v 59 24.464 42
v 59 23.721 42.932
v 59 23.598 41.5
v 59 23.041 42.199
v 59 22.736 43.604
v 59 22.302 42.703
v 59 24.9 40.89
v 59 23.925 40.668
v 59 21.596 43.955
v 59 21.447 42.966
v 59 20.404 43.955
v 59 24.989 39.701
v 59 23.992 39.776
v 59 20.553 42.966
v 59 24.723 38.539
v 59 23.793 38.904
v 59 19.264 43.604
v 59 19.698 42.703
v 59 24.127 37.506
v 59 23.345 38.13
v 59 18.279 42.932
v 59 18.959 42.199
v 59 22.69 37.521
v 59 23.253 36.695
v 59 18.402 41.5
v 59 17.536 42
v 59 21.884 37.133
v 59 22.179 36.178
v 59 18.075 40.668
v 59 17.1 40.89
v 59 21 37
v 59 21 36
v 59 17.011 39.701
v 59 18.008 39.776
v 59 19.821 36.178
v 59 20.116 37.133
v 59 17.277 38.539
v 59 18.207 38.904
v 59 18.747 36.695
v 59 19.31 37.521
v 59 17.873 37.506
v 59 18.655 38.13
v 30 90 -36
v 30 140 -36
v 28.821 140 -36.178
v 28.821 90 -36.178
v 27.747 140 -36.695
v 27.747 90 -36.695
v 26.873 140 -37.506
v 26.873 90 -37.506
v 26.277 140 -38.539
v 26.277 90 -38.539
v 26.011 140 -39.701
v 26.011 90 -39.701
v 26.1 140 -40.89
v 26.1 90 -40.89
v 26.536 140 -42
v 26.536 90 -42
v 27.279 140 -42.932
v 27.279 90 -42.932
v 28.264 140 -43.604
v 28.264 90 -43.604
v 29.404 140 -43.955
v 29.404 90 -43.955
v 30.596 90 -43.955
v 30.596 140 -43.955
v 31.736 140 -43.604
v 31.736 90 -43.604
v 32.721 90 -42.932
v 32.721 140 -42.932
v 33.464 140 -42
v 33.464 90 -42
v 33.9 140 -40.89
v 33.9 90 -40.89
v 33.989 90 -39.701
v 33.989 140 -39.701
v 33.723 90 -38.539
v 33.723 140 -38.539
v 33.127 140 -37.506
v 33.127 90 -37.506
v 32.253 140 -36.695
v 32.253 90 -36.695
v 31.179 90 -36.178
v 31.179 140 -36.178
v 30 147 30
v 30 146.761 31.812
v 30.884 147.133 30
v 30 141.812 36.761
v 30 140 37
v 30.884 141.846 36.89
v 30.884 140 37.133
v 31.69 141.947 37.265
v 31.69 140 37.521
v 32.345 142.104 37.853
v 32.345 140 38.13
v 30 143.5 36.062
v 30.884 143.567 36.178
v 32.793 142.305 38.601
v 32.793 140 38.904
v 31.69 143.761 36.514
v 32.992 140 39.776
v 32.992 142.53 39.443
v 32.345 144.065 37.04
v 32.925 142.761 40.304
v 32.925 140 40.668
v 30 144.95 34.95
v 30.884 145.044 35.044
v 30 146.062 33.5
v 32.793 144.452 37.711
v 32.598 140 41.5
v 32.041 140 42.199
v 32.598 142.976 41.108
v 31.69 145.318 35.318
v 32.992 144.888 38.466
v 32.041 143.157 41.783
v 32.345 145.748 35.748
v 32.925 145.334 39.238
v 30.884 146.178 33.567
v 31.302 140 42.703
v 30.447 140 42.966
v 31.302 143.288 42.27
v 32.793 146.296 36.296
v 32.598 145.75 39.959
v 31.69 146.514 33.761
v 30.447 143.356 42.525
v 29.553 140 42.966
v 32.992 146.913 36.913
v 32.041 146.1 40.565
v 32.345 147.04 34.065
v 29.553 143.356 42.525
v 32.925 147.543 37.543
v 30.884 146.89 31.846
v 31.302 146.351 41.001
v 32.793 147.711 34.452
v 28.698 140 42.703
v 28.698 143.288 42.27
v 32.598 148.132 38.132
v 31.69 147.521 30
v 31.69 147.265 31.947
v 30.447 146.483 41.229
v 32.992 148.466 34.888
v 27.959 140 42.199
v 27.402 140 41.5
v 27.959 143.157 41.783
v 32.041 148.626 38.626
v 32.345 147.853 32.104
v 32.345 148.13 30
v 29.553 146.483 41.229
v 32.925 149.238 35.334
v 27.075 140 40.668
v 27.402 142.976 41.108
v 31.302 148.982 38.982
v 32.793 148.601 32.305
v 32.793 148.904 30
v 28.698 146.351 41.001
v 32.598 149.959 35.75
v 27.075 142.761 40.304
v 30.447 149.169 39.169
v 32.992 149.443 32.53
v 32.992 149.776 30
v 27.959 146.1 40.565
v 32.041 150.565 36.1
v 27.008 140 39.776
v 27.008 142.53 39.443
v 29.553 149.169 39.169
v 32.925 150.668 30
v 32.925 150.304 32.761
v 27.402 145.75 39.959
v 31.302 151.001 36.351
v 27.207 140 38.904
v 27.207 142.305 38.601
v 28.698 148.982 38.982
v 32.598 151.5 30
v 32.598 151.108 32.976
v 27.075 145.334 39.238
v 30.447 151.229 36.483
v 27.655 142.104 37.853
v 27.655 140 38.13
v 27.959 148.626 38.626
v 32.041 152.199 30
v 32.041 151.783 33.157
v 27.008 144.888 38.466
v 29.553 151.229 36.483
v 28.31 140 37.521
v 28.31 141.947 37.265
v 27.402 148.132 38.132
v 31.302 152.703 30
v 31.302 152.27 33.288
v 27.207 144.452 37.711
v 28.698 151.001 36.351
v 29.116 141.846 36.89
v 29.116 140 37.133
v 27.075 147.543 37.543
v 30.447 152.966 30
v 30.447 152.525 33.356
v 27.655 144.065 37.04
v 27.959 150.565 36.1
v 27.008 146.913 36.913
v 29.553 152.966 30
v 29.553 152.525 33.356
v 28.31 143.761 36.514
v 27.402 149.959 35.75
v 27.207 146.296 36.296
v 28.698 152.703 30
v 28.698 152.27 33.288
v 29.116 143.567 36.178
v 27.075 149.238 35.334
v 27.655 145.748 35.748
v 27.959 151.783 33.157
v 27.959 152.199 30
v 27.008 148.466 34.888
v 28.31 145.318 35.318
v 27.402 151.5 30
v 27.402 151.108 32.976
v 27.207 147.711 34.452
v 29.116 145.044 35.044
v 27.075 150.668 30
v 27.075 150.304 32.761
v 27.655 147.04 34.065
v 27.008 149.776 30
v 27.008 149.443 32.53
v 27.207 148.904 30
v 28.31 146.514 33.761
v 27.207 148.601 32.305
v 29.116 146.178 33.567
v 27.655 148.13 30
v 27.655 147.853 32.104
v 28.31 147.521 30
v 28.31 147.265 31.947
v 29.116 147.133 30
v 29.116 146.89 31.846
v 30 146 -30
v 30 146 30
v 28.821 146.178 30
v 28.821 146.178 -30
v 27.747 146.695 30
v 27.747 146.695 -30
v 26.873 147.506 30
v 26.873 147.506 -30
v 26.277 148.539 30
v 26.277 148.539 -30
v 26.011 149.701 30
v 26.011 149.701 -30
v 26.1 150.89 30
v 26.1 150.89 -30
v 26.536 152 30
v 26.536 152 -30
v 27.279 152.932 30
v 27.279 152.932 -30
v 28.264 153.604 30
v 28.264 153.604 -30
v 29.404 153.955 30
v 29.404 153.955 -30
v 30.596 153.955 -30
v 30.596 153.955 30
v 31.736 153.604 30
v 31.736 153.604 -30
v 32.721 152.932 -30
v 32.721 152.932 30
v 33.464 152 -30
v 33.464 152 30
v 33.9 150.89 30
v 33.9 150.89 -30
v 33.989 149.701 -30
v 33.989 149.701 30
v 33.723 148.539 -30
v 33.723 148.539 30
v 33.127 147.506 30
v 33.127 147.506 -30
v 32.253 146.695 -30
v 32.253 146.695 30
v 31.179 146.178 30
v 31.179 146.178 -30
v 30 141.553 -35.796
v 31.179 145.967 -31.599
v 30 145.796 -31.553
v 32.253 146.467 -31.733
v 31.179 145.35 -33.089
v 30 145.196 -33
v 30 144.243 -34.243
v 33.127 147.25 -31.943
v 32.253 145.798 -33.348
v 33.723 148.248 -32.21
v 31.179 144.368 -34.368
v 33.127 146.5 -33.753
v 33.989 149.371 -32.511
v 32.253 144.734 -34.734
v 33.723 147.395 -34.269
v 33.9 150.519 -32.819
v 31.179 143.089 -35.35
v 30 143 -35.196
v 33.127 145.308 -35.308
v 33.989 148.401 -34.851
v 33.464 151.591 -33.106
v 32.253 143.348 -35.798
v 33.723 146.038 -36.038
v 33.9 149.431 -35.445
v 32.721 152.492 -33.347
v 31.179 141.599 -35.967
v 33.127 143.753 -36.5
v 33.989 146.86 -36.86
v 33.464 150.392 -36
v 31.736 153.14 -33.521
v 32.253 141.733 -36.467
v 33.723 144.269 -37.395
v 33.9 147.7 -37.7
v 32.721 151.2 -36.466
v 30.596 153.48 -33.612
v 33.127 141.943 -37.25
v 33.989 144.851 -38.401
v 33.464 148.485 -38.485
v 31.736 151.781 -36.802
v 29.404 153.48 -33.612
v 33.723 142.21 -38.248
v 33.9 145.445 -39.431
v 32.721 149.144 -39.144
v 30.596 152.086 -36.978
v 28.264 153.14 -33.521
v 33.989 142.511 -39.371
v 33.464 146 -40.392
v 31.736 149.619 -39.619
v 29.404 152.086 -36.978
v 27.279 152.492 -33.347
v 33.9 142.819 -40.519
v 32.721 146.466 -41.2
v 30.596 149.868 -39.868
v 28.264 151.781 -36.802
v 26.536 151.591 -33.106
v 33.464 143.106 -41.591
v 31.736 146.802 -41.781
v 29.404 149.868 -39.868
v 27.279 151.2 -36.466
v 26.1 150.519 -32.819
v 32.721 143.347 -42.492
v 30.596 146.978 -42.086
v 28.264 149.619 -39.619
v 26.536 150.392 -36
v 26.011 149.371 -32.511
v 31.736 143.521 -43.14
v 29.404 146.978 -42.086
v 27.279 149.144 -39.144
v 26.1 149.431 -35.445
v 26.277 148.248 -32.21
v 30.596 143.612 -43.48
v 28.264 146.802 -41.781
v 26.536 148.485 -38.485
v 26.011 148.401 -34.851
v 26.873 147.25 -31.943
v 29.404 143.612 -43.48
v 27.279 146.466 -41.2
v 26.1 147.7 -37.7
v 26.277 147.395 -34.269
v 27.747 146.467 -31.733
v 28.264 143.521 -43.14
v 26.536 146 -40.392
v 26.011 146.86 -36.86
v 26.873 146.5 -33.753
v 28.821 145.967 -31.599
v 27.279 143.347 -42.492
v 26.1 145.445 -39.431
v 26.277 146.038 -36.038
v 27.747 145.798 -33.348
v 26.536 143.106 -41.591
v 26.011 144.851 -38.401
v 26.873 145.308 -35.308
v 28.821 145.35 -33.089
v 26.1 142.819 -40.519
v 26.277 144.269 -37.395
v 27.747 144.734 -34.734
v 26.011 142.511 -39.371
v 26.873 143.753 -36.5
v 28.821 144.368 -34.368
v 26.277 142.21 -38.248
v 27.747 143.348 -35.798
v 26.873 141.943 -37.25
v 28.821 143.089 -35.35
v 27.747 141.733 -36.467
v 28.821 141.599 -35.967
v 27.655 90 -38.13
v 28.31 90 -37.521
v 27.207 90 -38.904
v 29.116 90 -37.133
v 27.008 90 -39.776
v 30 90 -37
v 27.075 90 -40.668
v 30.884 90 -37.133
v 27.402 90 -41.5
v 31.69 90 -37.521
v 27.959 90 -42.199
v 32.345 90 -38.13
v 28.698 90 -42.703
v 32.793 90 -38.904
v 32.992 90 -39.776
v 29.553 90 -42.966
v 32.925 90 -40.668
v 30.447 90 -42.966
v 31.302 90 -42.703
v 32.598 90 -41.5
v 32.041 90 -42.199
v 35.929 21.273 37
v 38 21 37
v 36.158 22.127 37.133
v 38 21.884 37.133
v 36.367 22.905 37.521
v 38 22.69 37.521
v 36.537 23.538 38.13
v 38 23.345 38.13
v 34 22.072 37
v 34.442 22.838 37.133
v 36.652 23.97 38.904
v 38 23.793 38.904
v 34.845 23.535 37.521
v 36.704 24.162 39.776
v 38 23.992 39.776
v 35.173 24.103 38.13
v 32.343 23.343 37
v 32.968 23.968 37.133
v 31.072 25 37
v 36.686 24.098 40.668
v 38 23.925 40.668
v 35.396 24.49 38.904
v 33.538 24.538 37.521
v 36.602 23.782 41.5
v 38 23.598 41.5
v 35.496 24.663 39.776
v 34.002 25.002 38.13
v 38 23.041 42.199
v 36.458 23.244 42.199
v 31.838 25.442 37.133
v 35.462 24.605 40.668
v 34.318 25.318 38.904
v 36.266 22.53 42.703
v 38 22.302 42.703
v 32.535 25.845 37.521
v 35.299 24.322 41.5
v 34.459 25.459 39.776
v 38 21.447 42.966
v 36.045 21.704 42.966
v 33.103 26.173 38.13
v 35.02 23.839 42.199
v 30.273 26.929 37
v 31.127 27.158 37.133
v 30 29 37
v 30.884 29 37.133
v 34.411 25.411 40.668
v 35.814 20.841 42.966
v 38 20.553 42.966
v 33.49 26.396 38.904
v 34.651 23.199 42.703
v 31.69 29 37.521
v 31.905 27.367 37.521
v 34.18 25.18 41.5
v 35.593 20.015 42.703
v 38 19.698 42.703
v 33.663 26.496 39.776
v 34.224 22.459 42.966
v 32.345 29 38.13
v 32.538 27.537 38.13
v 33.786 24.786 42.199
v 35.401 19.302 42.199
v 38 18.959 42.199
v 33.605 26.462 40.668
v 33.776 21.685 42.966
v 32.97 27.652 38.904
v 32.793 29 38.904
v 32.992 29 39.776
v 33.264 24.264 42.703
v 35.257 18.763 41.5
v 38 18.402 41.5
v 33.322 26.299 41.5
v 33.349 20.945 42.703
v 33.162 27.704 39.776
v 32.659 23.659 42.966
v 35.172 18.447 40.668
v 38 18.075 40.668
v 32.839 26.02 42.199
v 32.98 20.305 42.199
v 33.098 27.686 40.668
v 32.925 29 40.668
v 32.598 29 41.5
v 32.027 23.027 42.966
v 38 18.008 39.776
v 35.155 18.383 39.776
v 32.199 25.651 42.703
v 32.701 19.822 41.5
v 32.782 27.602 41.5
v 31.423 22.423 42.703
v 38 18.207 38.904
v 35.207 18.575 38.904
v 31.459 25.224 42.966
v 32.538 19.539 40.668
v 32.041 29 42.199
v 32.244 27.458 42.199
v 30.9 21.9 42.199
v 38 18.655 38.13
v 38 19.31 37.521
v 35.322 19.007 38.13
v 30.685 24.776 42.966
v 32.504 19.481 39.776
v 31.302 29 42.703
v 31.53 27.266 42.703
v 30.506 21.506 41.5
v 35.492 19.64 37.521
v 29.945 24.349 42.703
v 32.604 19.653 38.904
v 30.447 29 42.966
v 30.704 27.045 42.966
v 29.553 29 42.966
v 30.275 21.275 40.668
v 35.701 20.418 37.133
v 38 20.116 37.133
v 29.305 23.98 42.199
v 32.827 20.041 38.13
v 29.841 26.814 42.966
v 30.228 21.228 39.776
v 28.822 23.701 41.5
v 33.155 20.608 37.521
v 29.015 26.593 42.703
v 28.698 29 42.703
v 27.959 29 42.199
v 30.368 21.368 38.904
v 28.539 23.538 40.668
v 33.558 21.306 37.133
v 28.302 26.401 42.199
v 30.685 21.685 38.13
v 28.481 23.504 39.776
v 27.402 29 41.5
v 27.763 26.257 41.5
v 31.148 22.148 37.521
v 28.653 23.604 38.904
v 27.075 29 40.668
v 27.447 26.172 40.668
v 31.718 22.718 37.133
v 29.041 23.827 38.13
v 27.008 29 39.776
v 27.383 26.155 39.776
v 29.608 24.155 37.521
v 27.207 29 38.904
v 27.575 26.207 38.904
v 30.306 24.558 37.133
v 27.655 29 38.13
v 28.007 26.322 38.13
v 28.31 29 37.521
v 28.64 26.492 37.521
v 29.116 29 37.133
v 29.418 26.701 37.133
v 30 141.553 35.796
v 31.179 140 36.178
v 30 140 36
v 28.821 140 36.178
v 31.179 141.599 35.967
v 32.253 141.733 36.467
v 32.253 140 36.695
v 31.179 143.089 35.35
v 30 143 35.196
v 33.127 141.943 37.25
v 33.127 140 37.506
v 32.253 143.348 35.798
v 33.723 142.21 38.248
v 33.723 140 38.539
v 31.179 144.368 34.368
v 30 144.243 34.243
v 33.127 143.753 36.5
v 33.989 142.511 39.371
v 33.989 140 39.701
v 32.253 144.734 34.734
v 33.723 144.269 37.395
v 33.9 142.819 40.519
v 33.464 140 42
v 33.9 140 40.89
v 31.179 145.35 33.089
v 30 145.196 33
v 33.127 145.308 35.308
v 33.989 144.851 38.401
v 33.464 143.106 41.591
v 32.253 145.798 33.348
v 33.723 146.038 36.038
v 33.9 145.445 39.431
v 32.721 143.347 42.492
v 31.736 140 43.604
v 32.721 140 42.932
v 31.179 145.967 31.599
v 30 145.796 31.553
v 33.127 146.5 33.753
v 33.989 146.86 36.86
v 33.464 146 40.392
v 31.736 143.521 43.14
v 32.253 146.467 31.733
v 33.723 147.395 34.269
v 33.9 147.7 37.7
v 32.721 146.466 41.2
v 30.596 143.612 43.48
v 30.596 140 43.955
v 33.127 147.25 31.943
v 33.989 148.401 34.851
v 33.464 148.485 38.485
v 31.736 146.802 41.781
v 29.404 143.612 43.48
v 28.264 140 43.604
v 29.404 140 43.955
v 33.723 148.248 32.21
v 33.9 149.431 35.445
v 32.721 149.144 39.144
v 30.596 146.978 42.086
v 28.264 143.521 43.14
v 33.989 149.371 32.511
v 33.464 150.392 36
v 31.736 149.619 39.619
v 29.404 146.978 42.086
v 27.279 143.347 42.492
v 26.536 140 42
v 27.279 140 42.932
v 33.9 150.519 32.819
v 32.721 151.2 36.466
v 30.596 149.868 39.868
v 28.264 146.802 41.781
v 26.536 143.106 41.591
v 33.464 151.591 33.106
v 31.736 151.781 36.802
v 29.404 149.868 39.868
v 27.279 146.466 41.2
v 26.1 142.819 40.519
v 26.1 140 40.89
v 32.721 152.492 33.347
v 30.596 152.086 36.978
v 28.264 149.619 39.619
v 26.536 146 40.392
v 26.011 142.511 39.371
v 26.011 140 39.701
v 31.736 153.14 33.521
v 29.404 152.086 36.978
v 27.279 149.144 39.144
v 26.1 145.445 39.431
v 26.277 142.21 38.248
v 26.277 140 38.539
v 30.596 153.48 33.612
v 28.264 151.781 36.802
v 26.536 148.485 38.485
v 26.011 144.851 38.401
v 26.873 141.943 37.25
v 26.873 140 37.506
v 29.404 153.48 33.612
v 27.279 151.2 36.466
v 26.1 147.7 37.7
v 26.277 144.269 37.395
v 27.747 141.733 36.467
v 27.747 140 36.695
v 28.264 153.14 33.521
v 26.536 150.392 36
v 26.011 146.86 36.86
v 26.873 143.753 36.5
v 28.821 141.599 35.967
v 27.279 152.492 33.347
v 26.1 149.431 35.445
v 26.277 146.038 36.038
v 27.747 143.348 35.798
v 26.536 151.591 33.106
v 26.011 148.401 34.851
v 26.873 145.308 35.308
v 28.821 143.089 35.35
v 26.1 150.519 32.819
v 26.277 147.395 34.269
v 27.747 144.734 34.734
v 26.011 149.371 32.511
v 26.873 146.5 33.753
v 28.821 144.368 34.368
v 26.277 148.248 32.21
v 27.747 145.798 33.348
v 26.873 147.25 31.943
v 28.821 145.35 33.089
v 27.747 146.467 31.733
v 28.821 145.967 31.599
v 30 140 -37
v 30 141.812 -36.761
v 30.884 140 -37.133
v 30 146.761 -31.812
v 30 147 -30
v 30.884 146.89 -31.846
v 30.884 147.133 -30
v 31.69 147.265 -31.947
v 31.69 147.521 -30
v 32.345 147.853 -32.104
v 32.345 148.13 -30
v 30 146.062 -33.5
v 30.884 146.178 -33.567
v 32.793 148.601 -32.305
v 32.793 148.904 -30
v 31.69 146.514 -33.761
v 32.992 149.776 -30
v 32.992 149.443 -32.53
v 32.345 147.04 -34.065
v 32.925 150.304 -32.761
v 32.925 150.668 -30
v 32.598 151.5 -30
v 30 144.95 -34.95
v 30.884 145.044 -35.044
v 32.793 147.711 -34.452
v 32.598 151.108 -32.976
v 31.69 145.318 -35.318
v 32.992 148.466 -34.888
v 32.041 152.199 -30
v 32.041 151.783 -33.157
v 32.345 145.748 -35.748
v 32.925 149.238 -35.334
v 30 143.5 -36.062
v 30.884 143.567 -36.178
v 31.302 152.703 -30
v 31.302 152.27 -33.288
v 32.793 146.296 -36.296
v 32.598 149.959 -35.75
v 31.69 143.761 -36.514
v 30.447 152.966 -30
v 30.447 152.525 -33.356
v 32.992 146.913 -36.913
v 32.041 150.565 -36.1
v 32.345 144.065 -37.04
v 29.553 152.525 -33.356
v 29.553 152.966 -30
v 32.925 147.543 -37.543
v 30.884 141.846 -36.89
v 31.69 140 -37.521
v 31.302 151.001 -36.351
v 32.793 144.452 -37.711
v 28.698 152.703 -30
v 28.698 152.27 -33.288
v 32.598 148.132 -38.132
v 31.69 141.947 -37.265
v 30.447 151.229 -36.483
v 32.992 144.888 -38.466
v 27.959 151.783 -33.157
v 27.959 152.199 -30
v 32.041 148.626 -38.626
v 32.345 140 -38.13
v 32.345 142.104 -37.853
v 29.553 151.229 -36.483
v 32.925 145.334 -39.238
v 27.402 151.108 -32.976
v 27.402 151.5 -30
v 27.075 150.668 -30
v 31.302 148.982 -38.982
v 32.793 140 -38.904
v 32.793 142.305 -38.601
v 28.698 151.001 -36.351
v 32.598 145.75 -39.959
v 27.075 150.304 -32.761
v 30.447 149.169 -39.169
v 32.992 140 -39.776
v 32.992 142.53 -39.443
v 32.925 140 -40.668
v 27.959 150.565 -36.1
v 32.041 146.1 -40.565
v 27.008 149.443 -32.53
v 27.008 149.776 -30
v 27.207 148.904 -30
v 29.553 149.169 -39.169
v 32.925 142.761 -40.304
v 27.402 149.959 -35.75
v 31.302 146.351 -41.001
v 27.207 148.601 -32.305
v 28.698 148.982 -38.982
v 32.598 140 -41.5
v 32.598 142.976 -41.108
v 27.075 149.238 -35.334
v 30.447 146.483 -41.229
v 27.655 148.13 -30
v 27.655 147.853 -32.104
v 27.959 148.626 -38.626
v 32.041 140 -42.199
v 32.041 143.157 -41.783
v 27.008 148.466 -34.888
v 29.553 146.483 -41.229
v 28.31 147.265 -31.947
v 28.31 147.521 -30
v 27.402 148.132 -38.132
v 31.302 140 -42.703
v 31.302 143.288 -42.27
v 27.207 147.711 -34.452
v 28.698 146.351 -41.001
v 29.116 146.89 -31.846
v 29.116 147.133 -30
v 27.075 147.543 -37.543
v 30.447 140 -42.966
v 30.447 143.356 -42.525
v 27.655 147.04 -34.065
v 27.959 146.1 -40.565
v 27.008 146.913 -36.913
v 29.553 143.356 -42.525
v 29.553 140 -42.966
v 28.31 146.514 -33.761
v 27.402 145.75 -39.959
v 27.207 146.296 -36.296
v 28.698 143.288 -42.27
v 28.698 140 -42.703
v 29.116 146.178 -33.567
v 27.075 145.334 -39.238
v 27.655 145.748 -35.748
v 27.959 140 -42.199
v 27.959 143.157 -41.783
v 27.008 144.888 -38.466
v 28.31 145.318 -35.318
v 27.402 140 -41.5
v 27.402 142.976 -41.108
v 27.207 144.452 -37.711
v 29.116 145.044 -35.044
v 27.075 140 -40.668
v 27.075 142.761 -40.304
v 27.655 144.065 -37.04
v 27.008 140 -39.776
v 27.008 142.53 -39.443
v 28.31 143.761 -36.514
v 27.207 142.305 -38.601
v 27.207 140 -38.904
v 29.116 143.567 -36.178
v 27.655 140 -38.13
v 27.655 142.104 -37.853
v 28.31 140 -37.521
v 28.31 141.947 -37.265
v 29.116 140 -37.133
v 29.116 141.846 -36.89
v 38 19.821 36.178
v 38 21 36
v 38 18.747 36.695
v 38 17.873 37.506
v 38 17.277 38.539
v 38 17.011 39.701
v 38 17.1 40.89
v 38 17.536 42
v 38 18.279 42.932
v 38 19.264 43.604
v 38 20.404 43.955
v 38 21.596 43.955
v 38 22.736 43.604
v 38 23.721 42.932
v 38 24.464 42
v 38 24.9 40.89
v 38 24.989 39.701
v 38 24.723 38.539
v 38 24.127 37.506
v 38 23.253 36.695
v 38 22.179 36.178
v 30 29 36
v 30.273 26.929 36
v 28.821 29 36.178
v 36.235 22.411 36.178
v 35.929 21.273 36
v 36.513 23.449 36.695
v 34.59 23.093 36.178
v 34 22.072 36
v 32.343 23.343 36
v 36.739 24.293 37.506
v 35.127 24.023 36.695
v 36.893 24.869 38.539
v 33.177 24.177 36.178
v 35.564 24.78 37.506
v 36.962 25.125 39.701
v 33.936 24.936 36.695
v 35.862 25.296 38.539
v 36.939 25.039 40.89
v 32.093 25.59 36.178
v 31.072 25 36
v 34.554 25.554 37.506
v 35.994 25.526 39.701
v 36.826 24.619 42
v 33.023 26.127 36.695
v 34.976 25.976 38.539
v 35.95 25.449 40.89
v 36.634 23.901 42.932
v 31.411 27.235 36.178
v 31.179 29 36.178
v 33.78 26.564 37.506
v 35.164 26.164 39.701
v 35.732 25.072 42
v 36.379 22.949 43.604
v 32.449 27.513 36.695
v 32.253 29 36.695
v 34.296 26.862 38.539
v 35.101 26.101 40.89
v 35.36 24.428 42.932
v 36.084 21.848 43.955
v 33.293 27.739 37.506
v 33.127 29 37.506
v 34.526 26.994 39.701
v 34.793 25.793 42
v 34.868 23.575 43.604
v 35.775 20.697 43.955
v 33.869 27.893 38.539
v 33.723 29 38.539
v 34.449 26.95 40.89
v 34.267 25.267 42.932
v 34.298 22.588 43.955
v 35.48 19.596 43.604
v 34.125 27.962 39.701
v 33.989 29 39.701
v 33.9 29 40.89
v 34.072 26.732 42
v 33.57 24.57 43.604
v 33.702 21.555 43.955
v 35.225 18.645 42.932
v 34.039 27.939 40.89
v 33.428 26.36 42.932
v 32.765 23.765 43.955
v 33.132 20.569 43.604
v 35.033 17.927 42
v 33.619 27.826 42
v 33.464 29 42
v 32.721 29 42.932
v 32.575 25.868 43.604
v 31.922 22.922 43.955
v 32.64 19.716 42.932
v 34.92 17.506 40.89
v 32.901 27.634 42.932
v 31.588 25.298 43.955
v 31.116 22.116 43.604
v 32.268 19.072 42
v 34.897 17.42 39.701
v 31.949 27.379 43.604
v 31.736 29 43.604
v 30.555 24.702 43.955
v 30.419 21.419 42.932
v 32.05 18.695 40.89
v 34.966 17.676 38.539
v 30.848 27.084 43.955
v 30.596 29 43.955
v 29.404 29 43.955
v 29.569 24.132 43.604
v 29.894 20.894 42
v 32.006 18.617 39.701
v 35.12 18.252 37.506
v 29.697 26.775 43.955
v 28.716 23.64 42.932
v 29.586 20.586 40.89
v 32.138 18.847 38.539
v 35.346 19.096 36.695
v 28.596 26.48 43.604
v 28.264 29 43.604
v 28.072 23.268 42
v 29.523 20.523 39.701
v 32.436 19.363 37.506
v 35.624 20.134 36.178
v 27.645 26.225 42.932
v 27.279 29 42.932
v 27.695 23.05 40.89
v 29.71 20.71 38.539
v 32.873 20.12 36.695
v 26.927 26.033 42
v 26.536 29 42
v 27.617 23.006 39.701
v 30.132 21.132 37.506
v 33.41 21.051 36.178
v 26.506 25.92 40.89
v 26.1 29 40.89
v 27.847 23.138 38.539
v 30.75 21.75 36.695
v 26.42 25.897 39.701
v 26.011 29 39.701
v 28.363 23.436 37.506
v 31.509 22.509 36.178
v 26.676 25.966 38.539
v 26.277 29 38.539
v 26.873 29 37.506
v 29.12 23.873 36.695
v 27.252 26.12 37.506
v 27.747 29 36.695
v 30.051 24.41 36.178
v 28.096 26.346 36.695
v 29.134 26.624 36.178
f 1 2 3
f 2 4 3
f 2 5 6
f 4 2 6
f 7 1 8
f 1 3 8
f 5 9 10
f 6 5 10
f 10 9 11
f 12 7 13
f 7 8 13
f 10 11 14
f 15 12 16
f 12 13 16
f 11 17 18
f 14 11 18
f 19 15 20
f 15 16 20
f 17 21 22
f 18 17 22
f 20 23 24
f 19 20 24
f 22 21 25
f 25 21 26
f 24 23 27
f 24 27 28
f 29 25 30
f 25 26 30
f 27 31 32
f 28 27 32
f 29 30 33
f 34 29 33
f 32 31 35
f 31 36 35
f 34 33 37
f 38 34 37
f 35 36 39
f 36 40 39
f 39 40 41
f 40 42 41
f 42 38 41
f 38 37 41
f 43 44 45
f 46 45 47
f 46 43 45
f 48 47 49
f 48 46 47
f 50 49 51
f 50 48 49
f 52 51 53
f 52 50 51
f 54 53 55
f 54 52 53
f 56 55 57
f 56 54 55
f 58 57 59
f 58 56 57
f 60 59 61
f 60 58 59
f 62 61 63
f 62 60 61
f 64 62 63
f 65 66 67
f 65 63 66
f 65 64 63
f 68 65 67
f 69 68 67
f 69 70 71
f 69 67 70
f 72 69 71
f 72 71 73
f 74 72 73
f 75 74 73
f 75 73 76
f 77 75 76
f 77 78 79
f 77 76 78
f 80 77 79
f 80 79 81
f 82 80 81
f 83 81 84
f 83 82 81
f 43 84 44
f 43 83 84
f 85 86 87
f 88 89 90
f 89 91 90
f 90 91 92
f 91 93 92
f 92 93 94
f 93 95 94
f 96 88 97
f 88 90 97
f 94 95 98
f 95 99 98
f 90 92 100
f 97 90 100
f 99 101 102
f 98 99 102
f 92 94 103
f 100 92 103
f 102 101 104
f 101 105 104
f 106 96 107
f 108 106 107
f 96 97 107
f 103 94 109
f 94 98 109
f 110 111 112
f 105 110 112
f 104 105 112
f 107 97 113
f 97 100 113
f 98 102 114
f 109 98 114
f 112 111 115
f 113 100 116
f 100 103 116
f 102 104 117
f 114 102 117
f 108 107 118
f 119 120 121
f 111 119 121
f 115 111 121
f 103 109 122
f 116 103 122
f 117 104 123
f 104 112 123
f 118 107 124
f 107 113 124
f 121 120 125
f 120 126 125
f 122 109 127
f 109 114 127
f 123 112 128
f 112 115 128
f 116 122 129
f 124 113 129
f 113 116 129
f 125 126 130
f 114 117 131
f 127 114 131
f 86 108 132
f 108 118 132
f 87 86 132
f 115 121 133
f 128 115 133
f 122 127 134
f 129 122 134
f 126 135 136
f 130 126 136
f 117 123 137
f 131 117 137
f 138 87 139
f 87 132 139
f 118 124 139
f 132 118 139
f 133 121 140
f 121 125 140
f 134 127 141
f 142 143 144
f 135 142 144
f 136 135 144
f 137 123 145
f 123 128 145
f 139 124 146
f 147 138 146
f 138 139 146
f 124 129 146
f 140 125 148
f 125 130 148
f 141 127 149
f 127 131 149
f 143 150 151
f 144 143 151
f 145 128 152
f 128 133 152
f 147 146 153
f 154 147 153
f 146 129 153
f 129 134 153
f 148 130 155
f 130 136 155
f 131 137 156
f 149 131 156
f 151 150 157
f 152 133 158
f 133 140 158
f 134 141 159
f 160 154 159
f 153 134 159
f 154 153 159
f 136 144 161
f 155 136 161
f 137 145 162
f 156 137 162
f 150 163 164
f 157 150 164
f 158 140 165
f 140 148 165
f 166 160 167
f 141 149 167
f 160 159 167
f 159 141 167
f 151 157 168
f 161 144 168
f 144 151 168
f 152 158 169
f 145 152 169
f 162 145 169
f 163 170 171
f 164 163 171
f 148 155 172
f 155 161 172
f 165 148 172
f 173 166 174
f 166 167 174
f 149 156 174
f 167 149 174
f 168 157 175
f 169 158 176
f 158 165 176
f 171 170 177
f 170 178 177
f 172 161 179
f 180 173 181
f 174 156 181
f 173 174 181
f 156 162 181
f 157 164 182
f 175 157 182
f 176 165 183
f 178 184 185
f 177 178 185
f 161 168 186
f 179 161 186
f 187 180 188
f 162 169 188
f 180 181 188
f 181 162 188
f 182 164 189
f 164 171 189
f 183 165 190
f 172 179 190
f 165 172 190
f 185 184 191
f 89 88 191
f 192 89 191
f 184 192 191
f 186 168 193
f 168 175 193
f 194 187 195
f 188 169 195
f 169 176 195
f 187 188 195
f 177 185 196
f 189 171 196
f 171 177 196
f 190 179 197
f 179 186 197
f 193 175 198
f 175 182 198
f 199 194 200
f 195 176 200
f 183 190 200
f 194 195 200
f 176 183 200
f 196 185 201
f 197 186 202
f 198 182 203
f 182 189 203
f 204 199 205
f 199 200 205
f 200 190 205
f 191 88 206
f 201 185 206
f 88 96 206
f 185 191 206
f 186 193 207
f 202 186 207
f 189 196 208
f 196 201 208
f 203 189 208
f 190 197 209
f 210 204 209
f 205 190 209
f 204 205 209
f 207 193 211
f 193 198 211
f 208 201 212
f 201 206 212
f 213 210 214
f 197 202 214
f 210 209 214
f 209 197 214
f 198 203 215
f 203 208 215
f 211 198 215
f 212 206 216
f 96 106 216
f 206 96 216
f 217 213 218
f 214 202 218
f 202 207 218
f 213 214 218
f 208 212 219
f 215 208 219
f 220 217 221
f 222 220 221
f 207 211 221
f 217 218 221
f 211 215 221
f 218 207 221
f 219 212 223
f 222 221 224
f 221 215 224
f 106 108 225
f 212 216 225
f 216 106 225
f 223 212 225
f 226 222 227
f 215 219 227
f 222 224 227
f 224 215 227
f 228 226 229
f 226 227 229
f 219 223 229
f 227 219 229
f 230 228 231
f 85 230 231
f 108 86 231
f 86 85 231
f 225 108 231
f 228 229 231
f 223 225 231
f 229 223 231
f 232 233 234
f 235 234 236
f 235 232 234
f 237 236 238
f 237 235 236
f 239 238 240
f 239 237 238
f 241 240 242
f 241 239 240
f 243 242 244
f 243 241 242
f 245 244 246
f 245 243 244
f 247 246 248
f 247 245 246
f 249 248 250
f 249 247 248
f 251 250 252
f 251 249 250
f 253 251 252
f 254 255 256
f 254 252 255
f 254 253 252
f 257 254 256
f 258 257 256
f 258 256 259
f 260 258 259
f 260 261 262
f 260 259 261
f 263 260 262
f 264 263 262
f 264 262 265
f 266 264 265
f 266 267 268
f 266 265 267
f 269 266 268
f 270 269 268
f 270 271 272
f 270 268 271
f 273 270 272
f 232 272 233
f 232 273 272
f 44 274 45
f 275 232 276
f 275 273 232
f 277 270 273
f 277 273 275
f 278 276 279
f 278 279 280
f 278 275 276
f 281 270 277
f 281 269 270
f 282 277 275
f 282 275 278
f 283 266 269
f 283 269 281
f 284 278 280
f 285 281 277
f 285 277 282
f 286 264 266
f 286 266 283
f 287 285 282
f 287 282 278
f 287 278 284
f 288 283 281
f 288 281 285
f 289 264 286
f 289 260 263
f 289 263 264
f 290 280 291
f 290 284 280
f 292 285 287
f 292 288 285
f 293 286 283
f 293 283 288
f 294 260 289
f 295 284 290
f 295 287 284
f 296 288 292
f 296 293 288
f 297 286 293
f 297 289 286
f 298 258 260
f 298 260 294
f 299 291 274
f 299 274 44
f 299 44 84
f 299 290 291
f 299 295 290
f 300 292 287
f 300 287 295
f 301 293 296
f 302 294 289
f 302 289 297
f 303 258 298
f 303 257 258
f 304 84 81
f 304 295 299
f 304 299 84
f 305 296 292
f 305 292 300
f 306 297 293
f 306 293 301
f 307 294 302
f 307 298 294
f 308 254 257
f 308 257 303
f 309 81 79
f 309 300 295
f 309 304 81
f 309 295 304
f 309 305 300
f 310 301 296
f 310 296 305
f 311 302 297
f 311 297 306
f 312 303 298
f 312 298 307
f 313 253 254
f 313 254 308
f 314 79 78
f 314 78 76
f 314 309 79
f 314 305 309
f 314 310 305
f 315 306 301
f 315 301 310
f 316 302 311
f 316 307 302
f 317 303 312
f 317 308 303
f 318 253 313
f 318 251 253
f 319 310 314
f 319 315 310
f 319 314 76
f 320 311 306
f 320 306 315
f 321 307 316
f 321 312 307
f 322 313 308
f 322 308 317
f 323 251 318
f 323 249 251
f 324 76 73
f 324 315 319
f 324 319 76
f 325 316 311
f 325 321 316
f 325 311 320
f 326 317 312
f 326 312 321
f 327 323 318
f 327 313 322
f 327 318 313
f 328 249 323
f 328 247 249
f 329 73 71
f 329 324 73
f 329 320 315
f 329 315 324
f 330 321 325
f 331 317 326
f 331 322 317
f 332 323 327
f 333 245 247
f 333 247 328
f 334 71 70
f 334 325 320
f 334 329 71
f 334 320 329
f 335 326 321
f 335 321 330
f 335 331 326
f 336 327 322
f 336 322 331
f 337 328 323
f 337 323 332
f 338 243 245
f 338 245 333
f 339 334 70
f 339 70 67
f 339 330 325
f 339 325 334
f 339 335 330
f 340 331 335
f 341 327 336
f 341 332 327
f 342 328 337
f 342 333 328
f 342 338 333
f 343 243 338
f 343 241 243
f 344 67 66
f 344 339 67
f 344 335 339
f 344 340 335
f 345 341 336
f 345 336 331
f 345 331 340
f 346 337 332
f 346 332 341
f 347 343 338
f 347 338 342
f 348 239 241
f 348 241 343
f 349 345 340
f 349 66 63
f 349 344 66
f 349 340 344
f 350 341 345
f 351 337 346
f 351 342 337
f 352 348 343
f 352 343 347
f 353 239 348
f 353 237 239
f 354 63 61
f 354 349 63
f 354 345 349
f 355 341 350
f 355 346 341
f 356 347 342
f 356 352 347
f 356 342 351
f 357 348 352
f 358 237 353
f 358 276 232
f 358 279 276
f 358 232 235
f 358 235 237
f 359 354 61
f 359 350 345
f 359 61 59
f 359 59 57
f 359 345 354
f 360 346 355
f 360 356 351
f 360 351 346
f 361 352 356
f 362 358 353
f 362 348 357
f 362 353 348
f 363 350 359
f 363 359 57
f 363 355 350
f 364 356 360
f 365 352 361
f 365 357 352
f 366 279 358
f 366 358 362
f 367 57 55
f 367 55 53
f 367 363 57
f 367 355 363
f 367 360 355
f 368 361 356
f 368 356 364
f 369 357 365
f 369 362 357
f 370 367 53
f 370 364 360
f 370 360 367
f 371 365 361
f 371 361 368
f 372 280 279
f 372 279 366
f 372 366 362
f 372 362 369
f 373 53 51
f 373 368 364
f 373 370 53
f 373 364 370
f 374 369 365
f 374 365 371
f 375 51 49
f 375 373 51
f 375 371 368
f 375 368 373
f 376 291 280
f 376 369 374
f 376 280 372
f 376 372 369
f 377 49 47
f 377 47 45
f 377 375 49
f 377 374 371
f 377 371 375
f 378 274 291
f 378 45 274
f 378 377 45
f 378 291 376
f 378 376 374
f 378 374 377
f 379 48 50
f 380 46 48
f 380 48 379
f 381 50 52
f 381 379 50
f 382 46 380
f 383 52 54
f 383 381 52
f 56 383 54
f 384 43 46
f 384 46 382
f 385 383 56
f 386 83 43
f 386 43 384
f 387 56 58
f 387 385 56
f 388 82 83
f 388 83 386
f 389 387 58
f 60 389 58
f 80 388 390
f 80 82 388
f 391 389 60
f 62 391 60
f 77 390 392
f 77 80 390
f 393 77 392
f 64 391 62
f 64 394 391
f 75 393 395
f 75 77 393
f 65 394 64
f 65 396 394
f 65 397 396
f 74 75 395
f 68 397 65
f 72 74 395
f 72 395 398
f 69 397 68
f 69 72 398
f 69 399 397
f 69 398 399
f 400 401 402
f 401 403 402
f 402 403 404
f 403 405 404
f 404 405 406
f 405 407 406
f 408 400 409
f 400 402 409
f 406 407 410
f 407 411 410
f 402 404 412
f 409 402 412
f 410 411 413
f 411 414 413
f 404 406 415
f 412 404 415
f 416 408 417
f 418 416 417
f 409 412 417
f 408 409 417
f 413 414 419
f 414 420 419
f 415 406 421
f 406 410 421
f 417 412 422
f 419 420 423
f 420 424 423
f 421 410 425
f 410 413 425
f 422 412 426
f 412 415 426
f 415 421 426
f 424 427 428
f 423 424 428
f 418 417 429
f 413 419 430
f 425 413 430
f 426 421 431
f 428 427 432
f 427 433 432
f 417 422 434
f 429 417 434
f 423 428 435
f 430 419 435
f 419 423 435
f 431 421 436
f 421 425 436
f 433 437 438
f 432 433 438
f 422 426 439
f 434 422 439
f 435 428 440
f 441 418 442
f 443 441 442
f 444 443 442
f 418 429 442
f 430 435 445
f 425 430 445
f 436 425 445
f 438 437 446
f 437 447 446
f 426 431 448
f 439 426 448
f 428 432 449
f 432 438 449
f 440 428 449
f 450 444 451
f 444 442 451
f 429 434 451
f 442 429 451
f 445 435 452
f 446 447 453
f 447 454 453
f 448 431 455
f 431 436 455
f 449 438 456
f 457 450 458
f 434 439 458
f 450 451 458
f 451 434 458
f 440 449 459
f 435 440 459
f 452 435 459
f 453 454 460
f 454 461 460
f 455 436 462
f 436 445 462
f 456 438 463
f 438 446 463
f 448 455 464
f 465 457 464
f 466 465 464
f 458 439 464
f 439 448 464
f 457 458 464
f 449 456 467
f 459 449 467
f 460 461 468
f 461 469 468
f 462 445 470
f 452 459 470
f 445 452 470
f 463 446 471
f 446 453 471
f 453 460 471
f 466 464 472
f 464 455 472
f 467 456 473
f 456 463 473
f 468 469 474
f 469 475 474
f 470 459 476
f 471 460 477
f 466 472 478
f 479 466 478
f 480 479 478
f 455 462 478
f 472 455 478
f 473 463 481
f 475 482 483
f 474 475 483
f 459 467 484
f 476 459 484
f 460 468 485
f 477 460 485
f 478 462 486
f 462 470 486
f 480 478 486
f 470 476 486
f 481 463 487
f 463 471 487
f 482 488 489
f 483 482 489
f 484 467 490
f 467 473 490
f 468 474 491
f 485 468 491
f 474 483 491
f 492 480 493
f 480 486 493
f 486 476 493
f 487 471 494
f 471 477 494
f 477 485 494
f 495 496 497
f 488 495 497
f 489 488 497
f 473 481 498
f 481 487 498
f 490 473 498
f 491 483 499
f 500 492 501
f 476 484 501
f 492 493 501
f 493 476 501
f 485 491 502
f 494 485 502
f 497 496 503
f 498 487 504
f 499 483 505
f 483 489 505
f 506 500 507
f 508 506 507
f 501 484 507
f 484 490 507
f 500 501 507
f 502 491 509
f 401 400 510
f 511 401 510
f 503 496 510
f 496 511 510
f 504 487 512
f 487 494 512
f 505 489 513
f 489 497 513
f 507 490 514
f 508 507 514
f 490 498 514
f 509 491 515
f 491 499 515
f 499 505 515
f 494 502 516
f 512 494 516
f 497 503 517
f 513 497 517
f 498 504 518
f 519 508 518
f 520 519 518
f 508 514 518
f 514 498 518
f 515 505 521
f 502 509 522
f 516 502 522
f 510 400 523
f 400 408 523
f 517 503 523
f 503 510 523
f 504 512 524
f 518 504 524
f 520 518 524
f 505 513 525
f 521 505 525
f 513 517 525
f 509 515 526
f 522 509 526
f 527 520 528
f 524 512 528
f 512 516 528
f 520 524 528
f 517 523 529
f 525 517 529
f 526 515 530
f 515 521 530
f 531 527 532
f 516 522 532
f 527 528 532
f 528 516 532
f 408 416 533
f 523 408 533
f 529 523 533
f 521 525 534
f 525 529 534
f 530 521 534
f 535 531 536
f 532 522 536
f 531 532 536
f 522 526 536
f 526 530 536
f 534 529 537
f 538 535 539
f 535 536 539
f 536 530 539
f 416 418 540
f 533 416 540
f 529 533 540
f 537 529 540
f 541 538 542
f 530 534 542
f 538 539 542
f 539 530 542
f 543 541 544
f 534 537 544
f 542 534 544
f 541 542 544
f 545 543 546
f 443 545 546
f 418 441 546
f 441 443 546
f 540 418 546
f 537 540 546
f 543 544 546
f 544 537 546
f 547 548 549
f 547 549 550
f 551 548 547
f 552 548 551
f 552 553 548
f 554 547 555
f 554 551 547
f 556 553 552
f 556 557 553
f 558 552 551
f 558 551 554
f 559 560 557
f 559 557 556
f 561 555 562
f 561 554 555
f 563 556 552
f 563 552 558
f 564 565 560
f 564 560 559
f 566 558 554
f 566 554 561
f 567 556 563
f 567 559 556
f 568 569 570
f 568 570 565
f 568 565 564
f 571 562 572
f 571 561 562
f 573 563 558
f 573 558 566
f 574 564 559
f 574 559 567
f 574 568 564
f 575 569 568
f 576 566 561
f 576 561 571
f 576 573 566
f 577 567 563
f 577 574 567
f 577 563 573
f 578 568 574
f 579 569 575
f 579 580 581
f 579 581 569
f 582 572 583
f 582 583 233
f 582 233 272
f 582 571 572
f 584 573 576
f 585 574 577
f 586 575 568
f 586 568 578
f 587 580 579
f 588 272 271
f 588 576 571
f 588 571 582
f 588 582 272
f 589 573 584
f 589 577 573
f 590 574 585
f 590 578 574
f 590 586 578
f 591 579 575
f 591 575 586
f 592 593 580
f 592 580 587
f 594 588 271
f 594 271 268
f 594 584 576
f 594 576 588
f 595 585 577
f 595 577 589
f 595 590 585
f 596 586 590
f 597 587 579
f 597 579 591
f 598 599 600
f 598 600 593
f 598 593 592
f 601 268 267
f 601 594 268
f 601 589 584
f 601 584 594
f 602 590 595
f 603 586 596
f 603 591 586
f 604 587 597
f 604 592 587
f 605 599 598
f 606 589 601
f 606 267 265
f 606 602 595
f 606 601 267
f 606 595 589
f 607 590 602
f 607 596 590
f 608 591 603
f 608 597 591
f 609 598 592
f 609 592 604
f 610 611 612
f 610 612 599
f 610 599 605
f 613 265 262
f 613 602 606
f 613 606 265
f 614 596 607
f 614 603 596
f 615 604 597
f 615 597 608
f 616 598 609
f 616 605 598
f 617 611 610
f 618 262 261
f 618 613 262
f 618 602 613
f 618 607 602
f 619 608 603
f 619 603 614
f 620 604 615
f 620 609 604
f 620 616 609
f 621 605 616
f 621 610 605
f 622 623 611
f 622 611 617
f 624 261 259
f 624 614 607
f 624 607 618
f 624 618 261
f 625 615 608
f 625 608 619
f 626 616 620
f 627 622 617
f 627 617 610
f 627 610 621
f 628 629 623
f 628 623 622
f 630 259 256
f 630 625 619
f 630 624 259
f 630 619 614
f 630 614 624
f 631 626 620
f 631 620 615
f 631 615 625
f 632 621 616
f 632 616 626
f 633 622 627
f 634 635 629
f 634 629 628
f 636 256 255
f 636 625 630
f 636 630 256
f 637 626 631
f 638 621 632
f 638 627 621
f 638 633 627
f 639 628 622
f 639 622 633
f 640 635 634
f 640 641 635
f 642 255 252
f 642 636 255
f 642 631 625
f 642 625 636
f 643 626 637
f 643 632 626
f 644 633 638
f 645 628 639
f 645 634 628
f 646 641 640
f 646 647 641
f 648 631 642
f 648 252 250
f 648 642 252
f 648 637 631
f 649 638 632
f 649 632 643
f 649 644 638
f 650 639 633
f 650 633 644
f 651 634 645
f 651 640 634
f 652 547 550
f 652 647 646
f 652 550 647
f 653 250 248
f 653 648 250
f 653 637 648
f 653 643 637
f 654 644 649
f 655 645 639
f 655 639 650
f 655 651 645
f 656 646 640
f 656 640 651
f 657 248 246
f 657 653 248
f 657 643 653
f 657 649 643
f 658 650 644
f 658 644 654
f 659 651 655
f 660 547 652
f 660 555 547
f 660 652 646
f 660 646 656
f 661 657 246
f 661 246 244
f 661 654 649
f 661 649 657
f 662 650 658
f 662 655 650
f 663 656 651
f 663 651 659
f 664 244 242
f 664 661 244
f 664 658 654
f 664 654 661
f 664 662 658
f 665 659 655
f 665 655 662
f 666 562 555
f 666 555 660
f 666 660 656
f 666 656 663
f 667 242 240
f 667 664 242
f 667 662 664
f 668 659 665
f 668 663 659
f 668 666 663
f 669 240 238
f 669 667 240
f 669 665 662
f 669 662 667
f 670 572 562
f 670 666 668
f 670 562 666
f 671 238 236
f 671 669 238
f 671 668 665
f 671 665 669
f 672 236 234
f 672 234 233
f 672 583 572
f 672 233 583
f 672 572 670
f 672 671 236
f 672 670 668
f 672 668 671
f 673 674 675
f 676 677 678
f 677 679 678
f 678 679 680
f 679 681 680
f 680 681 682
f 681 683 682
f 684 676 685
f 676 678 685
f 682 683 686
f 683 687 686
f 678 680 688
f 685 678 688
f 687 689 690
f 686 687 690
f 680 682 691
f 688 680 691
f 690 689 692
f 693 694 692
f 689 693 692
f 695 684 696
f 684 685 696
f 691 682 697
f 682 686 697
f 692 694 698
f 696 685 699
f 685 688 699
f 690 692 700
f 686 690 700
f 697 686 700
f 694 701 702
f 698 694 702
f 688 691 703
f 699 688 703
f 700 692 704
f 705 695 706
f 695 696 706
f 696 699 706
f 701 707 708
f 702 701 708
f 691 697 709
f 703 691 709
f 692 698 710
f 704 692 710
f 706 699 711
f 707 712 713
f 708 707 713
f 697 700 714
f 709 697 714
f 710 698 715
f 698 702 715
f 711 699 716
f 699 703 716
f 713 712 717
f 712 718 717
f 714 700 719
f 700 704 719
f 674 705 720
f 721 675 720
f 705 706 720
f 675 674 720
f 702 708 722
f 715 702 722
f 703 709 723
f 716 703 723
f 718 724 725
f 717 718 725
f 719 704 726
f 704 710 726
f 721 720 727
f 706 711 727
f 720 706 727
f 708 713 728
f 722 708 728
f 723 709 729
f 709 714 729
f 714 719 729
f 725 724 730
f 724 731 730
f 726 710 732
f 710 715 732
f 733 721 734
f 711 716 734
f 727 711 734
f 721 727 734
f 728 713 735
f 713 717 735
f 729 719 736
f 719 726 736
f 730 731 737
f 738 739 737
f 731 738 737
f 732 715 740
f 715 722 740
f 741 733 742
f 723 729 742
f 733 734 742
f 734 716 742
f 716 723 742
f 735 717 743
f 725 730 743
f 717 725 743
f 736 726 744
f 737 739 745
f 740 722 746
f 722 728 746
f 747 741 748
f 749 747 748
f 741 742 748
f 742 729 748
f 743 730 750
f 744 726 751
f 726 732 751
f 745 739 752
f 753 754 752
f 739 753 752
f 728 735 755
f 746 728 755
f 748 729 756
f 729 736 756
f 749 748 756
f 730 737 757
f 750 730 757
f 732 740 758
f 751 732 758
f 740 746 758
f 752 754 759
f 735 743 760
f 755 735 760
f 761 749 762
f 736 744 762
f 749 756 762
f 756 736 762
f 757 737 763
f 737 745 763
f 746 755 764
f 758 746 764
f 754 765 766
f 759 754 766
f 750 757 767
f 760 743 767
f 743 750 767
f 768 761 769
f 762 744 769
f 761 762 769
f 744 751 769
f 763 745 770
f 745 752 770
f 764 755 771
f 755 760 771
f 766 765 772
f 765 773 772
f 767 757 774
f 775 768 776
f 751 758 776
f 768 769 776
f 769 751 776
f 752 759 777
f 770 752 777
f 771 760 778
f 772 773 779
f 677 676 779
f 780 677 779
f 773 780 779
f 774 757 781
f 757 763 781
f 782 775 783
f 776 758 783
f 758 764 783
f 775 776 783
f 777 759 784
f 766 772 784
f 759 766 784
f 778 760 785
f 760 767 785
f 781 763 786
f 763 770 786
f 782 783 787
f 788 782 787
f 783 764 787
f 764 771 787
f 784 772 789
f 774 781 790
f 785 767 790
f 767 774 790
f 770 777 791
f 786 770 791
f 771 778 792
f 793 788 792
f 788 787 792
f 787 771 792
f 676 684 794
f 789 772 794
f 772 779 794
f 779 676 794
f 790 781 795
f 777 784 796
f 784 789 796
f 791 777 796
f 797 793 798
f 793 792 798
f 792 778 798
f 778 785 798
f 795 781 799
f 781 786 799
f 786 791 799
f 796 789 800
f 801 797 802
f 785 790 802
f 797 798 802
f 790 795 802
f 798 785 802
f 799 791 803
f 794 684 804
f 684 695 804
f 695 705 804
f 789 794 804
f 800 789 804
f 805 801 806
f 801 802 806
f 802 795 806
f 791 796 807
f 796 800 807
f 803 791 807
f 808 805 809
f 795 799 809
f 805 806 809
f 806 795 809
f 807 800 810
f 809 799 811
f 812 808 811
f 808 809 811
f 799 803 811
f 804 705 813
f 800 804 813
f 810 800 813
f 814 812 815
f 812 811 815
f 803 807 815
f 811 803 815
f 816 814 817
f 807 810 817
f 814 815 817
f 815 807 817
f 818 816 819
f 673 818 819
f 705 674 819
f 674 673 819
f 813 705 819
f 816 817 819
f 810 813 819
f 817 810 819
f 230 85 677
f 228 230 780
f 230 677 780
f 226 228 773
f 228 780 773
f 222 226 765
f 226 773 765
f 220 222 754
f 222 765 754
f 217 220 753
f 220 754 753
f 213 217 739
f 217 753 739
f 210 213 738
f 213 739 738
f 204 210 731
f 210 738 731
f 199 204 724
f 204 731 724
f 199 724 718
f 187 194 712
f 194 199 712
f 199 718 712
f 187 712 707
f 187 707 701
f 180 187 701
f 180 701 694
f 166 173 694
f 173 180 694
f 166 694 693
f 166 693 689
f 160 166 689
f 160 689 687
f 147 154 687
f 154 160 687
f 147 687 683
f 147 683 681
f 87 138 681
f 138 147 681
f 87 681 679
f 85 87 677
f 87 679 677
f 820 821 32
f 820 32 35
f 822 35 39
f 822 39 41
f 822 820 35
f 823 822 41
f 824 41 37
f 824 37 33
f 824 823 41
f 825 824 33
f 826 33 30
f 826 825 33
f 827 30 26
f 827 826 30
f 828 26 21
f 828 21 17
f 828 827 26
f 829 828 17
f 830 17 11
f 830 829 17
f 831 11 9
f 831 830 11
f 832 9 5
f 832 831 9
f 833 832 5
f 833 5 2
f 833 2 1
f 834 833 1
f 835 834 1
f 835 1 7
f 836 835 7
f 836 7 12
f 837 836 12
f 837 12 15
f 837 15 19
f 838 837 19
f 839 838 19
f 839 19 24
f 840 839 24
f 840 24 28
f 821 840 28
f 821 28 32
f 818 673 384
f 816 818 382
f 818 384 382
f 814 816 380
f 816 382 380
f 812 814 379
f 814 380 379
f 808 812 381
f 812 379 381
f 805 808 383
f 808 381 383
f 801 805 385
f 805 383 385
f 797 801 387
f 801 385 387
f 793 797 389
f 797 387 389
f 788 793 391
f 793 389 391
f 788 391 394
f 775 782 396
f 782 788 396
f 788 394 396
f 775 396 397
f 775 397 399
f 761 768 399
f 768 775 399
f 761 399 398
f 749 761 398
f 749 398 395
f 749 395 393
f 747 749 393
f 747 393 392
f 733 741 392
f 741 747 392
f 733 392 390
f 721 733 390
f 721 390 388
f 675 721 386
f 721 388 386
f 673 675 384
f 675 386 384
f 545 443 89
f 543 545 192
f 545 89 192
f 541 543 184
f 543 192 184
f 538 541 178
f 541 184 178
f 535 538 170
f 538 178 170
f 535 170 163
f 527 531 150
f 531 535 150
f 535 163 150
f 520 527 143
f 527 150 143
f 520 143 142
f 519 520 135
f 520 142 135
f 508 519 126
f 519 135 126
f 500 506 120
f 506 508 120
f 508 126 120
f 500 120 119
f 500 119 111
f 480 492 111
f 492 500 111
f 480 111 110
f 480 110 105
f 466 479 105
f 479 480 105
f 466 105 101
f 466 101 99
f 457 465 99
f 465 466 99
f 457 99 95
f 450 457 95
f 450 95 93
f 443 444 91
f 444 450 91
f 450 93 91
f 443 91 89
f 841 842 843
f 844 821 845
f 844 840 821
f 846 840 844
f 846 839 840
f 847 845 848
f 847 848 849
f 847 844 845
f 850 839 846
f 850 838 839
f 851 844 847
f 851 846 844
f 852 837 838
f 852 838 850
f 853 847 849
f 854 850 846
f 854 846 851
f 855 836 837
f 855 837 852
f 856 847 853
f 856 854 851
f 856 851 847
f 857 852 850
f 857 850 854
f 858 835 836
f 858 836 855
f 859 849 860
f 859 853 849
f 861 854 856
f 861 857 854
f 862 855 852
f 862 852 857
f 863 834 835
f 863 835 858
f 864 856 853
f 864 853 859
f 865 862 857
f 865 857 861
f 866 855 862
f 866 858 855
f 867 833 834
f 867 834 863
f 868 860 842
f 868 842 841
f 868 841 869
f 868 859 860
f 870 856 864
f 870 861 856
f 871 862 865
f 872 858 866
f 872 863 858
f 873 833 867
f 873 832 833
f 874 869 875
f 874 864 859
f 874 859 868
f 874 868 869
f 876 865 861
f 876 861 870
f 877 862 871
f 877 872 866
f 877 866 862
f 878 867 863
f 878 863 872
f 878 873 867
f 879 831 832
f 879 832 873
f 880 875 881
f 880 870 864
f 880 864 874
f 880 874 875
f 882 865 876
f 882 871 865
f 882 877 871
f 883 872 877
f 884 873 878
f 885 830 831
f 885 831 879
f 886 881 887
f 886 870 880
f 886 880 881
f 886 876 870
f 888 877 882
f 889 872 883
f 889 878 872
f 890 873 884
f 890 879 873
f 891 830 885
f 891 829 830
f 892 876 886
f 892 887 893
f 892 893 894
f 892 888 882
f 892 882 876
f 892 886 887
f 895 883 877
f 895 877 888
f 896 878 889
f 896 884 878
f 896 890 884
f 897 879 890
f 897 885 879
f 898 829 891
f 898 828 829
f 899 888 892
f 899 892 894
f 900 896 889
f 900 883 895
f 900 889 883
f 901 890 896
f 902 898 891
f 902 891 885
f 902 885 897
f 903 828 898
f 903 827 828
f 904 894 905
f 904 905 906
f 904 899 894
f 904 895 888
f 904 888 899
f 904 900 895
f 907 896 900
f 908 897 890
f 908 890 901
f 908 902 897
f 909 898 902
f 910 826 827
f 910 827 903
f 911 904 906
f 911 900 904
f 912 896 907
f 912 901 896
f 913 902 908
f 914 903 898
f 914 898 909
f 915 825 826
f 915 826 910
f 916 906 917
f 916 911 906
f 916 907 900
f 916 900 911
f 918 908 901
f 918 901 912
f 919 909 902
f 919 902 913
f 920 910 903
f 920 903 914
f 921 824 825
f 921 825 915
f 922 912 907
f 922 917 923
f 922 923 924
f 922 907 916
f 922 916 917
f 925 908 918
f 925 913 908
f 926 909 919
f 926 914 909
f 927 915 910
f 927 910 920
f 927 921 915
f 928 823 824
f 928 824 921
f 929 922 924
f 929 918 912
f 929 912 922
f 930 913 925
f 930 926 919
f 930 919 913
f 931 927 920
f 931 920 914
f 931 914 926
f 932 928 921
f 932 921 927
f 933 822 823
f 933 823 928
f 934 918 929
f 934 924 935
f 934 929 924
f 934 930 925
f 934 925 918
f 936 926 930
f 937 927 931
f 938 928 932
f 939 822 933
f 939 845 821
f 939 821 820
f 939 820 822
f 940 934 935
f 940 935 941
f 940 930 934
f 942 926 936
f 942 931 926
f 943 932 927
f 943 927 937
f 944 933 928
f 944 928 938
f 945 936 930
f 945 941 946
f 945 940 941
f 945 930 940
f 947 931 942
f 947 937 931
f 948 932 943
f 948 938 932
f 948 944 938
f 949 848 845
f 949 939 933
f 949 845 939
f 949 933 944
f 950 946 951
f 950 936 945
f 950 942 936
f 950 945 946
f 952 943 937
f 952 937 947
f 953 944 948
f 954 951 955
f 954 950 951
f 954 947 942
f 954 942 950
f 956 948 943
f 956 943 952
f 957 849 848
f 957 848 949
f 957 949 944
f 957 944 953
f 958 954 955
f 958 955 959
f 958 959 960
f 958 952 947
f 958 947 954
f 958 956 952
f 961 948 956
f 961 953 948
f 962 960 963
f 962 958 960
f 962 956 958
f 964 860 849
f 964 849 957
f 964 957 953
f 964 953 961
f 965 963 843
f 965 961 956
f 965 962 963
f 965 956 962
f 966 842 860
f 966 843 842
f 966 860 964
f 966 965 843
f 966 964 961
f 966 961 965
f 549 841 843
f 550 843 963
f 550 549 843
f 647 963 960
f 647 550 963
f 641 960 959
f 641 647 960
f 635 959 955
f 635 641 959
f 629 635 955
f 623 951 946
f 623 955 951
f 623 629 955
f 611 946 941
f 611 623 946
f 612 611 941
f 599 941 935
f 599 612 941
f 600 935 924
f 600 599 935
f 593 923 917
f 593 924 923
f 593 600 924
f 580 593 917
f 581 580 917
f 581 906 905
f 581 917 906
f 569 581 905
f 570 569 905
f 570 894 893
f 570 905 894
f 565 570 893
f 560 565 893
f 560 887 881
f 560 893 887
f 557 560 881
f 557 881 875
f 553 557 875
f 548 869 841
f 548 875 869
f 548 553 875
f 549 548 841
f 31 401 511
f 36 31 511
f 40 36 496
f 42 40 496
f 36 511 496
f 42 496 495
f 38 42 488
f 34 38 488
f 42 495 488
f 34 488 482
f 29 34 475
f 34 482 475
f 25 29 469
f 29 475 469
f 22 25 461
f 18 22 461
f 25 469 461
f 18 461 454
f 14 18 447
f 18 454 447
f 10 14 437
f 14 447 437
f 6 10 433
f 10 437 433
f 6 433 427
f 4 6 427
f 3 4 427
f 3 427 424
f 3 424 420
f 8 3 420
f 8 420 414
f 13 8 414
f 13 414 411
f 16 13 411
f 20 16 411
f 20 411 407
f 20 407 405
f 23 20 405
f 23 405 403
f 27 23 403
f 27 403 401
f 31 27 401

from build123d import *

# Parameters (mm, degrees)
TUBE_PROFILE_R   = 4
TUBE_PROFILE_R_2 = 3


with BuildPart() as part:
    # Tube: sweep along a curve in space
    with BuildLine() as tube_path:
        Line((59, 21, 40), (38, 21, 40))
        ThreePointArc((30, 29, 40), (32.343145751, 23.343145751, 40), (38, 21, 40))
        Line((30, 29, 40), (30, 140, 40))
        ThreePointArc((30, 150, 30), (30, 147.071067812, 37.071067812), (30, 140, 40))
        Line((30, 150, 30), (30, 150, -30))
        ThreePointArc((30, 140, -40), (30, 147.071067812, -37.071067812), (30, 150, -30))
        Line((30, 140, -40), (30, 90, -40))
    # Tube profile (on start of the path) → Tube (sweep)
    with BuildSketch(Plane(origin=(59, 21, 40), x_dir=(0, 0, -1), z_dir=(-1, 0, 0))):
        Circle(TUBE_PROFILE_R)
        Circle(TUBE_PROFILE_R_2, mode=Mode.SUBTRACT)
    sweep(path=tube_path.line)


solid = part.part
